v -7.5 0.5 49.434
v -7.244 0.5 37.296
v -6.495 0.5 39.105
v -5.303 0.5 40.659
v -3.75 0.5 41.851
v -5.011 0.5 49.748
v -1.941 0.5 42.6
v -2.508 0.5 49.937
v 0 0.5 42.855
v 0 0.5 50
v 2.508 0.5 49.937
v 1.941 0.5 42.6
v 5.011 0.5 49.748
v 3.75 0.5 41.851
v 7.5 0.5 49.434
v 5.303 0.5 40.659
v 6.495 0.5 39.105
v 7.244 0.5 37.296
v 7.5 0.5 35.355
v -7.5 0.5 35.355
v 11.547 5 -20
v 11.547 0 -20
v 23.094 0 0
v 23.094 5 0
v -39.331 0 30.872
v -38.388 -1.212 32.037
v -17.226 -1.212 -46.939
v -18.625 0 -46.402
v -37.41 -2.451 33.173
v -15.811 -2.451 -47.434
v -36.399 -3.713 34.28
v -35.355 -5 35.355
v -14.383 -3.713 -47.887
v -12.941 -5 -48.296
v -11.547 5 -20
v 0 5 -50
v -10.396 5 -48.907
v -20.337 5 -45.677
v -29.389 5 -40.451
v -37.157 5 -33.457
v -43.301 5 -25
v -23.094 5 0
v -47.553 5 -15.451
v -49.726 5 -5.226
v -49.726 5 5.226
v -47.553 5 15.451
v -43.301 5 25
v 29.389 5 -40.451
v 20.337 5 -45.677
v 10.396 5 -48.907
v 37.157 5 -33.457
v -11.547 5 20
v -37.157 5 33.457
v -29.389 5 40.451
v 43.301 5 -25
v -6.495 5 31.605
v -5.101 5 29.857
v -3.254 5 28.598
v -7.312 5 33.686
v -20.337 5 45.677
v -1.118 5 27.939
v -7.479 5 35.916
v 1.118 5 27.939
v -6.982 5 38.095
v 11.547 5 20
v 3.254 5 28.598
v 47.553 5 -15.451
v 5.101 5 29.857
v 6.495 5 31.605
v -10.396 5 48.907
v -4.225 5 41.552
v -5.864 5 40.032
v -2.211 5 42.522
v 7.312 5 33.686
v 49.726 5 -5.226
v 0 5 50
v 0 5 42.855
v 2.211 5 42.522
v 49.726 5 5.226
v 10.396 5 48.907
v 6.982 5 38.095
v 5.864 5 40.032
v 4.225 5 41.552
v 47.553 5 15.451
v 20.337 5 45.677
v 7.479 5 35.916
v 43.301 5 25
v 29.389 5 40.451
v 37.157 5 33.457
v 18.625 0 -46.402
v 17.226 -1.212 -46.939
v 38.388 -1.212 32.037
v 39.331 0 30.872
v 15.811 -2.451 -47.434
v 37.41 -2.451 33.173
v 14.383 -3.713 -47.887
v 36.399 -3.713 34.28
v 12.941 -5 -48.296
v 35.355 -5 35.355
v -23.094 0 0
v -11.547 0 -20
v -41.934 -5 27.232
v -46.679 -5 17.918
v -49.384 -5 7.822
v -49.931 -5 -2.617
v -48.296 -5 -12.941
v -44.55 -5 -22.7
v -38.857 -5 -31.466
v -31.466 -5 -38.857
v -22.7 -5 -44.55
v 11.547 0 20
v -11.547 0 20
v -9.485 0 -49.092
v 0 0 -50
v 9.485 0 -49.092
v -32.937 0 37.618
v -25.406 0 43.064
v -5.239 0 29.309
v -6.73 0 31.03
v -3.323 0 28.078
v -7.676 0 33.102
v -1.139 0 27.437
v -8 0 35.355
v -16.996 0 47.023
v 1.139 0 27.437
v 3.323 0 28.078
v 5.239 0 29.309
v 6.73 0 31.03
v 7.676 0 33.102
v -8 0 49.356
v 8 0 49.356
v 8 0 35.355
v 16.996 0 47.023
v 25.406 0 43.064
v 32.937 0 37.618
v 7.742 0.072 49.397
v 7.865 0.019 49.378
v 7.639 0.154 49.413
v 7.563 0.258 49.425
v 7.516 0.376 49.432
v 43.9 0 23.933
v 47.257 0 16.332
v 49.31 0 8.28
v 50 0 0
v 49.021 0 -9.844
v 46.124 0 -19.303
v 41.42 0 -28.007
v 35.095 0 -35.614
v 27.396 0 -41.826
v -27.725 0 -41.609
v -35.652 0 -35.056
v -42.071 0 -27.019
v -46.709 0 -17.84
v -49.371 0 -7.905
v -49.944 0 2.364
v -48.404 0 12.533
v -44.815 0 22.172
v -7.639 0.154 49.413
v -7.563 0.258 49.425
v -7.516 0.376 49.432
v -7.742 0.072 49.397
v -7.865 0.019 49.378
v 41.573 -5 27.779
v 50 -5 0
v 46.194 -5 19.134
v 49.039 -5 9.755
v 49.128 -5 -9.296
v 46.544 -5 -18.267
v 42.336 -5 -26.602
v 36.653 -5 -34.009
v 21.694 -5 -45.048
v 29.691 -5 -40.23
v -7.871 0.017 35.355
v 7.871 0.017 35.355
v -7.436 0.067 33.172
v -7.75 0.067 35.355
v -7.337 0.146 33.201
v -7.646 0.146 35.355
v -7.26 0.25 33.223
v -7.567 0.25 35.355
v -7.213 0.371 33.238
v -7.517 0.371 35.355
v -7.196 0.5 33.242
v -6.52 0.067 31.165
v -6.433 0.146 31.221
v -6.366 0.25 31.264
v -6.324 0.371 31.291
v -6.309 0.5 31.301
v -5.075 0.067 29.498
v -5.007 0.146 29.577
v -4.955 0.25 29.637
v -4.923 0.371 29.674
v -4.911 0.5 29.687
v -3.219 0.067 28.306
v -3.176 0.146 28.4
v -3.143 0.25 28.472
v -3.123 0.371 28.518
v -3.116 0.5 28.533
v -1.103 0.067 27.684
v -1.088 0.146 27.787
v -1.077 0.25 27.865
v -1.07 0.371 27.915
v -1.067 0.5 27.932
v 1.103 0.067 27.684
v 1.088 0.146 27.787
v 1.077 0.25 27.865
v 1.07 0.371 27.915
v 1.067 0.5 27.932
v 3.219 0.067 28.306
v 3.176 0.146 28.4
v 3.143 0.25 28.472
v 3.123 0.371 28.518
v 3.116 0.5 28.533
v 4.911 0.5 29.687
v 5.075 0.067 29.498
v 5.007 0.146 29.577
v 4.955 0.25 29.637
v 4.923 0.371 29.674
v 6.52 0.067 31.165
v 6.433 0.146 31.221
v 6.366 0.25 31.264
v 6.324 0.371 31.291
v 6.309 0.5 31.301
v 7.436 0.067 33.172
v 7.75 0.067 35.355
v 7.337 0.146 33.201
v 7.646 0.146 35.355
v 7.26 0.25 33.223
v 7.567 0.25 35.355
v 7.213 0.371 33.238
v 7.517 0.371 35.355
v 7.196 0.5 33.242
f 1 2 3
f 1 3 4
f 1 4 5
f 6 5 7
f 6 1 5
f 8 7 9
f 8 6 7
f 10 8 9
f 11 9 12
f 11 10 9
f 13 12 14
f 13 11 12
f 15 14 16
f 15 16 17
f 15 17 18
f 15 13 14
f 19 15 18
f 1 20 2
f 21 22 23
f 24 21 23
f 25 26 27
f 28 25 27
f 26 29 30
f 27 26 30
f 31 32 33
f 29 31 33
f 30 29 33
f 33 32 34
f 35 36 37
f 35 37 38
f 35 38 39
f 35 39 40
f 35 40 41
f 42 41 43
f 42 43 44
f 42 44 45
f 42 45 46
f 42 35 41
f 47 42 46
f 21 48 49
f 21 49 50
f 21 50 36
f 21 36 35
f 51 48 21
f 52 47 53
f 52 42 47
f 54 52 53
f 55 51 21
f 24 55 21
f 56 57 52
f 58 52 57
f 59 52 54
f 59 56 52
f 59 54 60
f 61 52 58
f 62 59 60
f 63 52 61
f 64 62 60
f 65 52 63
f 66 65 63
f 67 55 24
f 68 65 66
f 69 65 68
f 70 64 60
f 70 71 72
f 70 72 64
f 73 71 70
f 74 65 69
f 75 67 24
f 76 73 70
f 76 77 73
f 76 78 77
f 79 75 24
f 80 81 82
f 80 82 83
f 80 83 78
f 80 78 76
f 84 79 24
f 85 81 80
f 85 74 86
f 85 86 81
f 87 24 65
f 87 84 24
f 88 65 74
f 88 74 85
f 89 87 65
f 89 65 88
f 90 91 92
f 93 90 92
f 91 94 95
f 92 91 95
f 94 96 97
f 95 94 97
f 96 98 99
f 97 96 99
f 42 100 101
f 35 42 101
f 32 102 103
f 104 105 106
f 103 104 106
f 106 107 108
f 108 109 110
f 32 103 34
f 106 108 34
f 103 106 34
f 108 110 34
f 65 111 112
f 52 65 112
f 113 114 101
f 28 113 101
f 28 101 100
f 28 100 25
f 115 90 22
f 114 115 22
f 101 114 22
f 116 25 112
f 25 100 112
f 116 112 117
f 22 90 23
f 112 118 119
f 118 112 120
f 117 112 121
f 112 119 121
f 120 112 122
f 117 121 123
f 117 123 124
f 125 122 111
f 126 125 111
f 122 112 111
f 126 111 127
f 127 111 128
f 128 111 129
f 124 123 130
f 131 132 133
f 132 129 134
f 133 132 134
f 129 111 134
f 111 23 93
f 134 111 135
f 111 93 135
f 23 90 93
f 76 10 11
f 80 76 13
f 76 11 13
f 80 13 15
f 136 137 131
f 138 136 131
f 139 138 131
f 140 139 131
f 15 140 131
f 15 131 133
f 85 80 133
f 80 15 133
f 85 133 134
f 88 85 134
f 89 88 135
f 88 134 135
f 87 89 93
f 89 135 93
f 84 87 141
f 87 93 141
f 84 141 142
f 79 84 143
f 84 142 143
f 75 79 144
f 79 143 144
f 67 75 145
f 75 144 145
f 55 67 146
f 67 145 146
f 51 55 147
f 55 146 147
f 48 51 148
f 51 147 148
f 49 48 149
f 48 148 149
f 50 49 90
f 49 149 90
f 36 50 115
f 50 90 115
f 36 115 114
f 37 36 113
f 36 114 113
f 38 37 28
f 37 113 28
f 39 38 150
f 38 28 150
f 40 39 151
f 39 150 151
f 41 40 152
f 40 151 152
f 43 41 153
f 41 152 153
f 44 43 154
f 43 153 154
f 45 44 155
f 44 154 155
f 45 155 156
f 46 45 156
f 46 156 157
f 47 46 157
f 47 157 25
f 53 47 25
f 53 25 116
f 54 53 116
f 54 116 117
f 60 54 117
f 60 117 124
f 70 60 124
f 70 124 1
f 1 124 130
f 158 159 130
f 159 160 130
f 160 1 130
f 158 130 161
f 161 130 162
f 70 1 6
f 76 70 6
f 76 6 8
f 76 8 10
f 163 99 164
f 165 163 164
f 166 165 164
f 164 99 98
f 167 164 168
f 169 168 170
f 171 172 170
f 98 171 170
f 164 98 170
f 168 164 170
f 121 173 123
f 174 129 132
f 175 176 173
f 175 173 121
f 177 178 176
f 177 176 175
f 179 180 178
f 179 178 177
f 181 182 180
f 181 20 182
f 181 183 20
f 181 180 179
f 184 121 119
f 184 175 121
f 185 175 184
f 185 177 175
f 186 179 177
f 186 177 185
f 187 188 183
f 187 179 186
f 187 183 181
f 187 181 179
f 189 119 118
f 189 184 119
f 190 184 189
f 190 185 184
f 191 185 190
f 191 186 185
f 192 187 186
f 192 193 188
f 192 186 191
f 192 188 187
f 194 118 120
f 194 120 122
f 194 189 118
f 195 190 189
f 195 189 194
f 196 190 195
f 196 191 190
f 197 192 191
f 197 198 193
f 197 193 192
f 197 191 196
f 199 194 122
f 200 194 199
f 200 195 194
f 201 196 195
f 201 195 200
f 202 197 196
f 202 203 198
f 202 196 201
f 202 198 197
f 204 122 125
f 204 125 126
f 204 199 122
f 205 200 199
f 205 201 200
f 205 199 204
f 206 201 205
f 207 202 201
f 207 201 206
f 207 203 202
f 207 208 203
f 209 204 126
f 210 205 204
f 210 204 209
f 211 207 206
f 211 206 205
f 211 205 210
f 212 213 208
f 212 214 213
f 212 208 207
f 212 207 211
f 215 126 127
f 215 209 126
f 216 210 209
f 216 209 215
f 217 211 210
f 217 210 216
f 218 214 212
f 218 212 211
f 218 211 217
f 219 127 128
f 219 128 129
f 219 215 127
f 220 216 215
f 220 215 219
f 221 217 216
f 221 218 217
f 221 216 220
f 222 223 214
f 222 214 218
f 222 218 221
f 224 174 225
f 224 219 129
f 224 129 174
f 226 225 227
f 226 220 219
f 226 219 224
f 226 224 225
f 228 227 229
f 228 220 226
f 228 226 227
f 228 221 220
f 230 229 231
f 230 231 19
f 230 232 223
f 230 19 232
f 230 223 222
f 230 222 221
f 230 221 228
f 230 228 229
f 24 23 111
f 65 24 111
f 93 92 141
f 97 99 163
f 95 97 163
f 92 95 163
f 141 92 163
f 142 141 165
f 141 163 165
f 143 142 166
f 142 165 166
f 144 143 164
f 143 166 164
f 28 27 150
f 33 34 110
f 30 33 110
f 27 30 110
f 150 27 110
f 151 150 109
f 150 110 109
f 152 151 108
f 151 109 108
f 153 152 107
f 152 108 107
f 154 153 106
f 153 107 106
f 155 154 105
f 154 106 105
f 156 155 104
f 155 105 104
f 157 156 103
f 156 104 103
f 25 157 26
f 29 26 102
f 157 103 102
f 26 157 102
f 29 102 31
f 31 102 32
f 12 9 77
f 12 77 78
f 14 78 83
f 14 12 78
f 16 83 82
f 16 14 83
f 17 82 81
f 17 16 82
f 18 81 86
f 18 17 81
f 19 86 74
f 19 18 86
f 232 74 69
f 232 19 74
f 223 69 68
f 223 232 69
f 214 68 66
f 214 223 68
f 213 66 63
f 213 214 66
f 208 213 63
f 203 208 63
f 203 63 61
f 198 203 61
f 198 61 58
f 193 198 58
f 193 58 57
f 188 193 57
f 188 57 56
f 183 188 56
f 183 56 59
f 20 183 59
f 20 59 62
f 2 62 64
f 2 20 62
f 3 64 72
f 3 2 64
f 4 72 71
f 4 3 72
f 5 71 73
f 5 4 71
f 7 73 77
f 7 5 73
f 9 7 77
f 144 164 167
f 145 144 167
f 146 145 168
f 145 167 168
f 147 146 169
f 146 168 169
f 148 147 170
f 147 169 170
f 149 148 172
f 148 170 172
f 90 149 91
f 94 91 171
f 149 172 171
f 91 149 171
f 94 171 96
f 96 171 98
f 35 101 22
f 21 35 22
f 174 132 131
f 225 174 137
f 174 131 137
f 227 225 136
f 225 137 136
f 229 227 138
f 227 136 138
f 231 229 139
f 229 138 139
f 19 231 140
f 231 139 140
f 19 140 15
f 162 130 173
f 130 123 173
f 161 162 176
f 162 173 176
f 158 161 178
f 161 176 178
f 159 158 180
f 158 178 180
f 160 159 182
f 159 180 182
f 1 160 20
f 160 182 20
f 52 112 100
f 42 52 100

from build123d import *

# Parameters (mm, degrees)
SKETCH1_R               = 50
BOSS_EXTRUDE1_DEPTH     = 5
BOSS_EXTRUDE2_START     = -5
BOSS_EXTRUDE2_DEPTH     = 5
DRAFT1_ANGLE            = -45
CUT_EXTRUDE2_DEPTH      = 71.887234394
CUT_EXTRUDE2_DEPTH_BACK = 71.887234394
SKETCH1_8_R             = 7.5
CUT_EXTRUDE3_DEPTH      = 71.887234394
CUT_EXTRUDE4_DEPTH      = 0.5
FILLET1_R               = 0.5


with BuildPart() as part:
    # Sketch1 → Boss-Extrude1 (new body)
    with BuildSketch(Plane(origin=(0, 0, 0), x_dir=(1, 0, 0), z_dir=(0, 1, 0))):
        with Locations(Location((0, 0, 0), (0, 0, 270))):
            Circle(SKETCH1_R)
    extrude(amount=BOSS_EXTRUDE1_DEPTH)

    # Sketch1<5> → Boss-Extrude2 (add)
    with BuildSketch(Plane(origin=(0, 0, 0), x_dir=(1, 0, 0), z_dir=(0, 1, 0)).offset(BOSS_EXTRUDE2_START)):
        with BuildLine():
            Line((12.940952255, 48.296291314), (35.355339059, -35.355339059))
            ThreePointArc((35.355339059, -35.355339059), (46.193976626, -19.134171618), (50, 0))
            ThreePointArc((50, 0), (39.667667015, 30.43807145), (12.940952255, 48.296291314))
        make_face()
        with BuildLine():
            ThreePointArc((-12.940952255, 48.296291314), (-48.296291314, 12.940952255), (-35.355339059, -35.355339059))
            Line((-35.355339059, -35.355339059), (-12.940952255, 48.296291314))
        make_face()
    extrude(amount=BOSS_EXTRUDE2_DEPTH)

    # Draft1
    draft1_faces = [part.faces().sort_by_distance(p)[0] for p in [
        (24.148145657, -2.5, -6.470476128),
        (-24.148145657, -2.5, -6.470476128),
    ]]
    draft(draft1_faces, Plane(origin=(0, -5, 0), x_dir=(0, 0, -1), z_dir=(0, -1, 0)), DRAFT1_ANGLE)

    # Sketch1<8> → Cut-Extrude2 (cut, two sides: drawn at the far end of the back side and taken through both)
    with BuildSketch(Plane(origin=(0, 0, 0), x_dir=(1, 0, 0), z_dir=(0, 1, 0)).offset(-CUT_EXTRUDE2_DEPTH_BACK)):
        with Locations(Location((0, -35.355339059, 0), (0, 0, 270))):
            Circle(SKETCH1_8_R)
    extrude(amount=CUT_EXTRUDE2_DEPTH + CUT_EXTRUDE2_DEPTH_BACK, mode=Mode.SUBTRACT)

    # Sketch2 → Cut-Extrude3 (cut, through all)
    with BuildSketch(Plane.XZ):
        Polygon((23.094010768, 0), (11.547005384, 20), (-11.547005384, 20), (-23.094010768, 0), (-11.547005384, -20), (11.547005384, -20), align=None)
    extrude(amount=-CUT_EXTRUDE3_DEPTH, mode=Mode.SUBTRACT)

    # Sketch3 → Cut-Extrude4 (cut)
    with BuildSketch(Plane.XZ):
        with BuildLine():
            ThreePointArc((-7.5, 35.355339059), (0, 42.855339059), (7.5, 35.355339059))
            Line((7.5, 35.355339059), (7.5, 49.434299833))
            ThreePointArc((7.5, 49.434299833), (0, 50), (-7.5, 49.434299833))
            Line((-7.5, 49.434299833), (-7.5, 35.355339059))
        make_face()
    extrude(amount=-CUT_EXTRUDE4_DEPTH, mode=Mode.SUBTRACT)

    # Fillet1
    fillet1_edges = [part.edges().sort_by_distance(p)[0] for p in [
        (0, 0, 27.855339059),
        (-7.5, 0, 42.394819446),
        (7.5, 0, 42.394819446),
    ]]
    fillet(fillet1_edges, radius=FILLET1_R - 0.0001)  # a hair under: the kernel refuses the full size


solid = part.part
